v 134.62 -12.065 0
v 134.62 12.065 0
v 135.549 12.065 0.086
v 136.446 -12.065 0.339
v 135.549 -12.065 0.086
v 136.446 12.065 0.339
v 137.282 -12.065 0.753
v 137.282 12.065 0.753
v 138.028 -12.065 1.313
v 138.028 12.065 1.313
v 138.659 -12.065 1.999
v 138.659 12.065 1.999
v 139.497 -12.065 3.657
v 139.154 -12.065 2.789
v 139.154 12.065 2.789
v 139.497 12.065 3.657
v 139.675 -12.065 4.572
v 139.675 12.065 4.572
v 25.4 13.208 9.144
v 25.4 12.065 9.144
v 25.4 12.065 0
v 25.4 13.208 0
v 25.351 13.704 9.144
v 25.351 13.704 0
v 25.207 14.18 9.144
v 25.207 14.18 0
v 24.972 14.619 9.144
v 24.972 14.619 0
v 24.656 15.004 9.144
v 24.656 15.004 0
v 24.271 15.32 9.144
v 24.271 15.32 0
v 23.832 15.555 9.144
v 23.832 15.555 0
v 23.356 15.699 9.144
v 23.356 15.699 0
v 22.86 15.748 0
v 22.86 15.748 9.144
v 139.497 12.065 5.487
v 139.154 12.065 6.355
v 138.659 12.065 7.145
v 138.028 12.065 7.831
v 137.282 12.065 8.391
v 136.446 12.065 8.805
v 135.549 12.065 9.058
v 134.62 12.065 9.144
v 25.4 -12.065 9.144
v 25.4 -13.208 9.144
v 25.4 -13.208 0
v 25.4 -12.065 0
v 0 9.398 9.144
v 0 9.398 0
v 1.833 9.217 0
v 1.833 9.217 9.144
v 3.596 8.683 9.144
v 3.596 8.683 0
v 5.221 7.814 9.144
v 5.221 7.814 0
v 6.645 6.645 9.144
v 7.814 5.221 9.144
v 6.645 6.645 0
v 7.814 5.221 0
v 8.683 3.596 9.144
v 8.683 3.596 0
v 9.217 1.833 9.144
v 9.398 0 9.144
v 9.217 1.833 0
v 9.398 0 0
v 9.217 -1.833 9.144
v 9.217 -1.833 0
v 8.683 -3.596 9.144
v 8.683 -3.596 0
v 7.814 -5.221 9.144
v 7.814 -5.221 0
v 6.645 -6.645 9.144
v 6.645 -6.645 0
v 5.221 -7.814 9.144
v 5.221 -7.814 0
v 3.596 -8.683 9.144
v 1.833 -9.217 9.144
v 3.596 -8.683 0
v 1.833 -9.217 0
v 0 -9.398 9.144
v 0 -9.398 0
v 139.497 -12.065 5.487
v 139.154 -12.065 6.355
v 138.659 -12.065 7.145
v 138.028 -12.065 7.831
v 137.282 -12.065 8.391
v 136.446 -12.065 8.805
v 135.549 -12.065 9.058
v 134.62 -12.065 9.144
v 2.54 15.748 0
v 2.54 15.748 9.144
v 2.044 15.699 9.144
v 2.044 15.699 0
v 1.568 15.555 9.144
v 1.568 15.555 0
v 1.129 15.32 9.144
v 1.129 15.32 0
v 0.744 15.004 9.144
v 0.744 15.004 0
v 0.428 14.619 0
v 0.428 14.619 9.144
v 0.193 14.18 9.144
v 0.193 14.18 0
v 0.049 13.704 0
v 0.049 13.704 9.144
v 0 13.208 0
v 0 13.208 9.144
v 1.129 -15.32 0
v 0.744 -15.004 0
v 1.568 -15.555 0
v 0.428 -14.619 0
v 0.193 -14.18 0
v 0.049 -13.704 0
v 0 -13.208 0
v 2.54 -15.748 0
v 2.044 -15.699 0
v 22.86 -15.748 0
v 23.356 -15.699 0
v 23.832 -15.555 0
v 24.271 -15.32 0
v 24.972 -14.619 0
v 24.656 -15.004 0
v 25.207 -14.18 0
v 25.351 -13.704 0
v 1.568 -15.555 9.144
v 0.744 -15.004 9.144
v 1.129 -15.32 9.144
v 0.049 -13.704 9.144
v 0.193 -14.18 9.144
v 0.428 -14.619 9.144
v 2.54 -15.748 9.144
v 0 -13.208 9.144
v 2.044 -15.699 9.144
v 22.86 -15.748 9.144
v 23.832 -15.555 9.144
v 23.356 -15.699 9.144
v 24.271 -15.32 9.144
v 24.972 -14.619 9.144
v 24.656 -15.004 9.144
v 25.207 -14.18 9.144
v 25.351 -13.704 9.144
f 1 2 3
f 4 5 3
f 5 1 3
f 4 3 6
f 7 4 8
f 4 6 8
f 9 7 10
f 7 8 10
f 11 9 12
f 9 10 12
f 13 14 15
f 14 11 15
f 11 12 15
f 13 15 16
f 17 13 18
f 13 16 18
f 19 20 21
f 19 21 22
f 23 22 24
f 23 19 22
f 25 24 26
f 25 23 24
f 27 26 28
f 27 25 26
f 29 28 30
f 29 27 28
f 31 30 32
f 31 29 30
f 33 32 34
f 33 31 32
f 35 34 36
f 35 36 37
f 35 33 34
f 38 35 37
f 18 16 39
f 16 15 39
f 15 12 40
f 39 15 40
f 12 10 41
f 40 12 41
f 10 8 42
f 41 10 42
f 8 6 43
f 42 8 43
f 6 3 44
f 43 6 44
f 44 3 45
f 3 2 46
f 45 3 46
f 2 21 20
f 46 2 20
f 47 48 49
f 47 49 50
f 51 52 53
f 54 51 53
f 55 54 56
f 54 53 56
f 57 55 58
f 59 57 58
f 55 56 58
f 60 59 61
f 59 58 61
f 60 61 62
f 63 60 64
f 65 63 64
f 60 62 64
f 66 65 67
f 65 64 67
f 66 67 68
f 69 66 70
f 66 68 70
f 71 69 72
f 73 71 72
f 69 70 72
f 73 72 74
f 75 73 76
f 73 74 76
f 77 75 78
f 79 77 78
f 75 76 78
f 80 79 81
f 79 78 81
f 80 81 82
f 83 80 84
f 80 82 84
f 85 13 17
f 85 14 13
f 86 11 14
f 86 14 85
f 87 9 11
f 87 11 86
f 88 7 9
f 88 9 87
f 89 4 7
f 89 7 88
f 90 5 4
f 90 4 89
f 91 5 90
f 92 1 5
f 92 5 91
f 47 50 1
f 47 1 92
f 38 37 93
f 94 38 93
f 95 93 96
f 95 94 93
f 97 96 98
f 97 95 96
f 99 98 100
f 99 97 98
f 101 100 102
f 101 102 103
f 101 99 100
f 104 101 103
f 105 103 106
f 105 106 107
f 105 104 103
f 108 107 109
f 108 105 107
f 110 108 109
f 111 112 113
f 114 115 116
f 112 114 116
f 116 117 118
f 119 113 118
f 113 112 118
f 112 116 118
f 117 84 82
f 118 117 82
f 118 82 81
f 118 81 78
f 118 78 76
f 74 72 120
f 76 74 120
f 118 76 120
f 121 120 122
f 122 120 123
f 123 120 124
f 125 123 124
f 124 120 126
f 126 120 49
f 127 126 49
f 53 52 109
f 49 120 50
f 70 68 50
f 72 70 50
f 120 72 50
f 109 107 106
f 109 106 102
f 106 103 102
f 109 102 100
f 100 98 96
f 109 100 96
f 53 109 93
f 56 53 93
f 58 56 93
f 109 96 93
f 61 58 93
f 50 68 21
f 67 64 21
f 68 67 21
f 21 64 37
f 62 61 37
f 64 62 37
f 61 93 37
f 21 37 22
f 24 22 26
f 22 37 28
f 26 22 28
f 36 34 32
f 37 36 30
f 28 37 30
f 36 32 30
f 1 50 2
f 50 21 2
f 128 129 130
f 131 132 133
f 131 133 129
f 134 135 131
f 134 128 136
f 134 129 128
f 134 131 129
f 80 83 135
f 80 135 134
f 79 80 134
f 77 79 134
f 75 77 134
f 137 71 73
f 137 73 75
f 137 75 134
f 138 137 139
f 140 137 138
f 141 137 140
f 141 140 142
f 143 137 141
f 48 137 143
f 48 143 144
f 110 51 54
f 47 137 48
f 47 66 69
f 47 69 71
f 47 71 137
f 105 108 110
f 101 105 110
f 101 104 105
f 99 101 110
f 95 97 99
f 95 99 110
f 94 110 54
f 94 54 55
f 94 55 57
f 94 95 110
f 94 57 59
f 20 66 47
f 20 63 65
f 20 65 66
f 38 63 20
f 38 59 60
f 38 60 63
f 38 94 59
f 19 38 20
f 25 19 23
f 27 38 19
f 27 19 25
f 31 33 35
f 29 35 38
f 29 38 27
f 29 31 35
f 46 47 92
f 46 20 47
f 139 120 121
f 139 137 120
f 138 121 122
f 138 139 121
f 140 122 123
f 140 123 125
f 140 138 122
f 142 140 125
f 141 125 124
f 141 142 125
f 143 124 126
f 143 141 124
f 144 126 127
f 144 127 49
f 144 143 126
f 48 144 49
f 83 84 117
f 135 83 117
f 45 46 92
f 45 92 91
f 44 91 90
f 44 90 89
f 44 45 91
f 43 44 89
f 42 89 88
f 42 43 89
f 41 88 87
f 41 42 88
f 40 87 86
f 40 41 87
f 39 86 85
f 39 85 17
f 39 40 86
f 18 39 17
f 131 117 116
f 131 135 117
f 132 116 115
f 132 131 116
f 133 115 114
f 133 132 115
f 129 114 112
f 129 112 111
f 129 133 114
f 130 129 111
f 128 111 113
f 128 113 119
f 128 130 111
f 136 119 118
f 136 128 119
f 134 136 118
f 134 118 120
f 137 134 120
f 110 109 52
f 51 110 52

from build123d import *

# Parameters (mm, degrees)
F1_DEPTH    = 9.144
F2_R        = 2.54
F3_W        = 24.13
F3_H        = 9.144
F4_DEPTH    = 114.3
F5_T1_DEPTH = 49.53


# Not quite as in the source:
# - a fillet or chamfer that OpenCascade refuses, or shapes differently, is made with other operations: its cross-section is extruded or revolved along the edge and cut away or added


with BuildPart() as f1:
    # F0 (on Top) → F1 (new body)
    with BuildSketch(Plane.XY):
        with BuildLine():
            ThreePointArc((0, 9.398), (9.398, 0), (0, -9.398))
            Line((0, -9.398), (0, -15.748))
            Line((0, -15.748), (25.4, -15.748))
            Line((25.4, -15.748), (25.4, 15.748))
            Line((25.4, 15.748), (0, 15.748))
            Line((0, 15.748), (0, 9.398))
        make_face()
    extrude(amount=F1_DEPTH)

    # F2
    f2_edges = [f1.edges().sort_by_distance(p)[0] for p in [
        (25.4, -15.748, 4.572),
        (0, -15.748, 4.572),
        (0, 15.748, 4.572),
        (25.4, 15.748, 4.572),
    ]]
    fillet(f2_edges, radius=F2_R)

    # F3 (on face) → F4 (join)
    with BuildSketch(Plane.YZ.offset(25.4)):
        with Locations((0, 4.572)):
            Rectangle(F3_W, F3_H)
    extrude(amount=F4_DEPTH)

    # F5: fillet of radius 5.08 on 2 edges, made by hand

    # F5_s2 → F5_t1 (cut)
    with BuildSketch(Plane.XZ.offset(-24.765)):
        with BuildLine():
            ThreePointArc((134.62, 9.144), (138.2121024484, 7.6561024484), (139.7, 4.064))
            Line((139.7, 4.064), (139.7, 9.144))
            Line((139.7, 9.144), (134.62, 9.144))
        make_face()
        with BuildLine():
            ThreePointArc((134.62, 0), (138.2121024484, 1.4878975516), (139.7, 5.08))
            Line((139.7, 5.08), (139.7, 0))
            Line((139.7, 0), (134.62, 0))
        make_face()
    extrude(amount=F5_T1_DEPTH, mode=Mode.SUBTRACT)


solid = f1.part
